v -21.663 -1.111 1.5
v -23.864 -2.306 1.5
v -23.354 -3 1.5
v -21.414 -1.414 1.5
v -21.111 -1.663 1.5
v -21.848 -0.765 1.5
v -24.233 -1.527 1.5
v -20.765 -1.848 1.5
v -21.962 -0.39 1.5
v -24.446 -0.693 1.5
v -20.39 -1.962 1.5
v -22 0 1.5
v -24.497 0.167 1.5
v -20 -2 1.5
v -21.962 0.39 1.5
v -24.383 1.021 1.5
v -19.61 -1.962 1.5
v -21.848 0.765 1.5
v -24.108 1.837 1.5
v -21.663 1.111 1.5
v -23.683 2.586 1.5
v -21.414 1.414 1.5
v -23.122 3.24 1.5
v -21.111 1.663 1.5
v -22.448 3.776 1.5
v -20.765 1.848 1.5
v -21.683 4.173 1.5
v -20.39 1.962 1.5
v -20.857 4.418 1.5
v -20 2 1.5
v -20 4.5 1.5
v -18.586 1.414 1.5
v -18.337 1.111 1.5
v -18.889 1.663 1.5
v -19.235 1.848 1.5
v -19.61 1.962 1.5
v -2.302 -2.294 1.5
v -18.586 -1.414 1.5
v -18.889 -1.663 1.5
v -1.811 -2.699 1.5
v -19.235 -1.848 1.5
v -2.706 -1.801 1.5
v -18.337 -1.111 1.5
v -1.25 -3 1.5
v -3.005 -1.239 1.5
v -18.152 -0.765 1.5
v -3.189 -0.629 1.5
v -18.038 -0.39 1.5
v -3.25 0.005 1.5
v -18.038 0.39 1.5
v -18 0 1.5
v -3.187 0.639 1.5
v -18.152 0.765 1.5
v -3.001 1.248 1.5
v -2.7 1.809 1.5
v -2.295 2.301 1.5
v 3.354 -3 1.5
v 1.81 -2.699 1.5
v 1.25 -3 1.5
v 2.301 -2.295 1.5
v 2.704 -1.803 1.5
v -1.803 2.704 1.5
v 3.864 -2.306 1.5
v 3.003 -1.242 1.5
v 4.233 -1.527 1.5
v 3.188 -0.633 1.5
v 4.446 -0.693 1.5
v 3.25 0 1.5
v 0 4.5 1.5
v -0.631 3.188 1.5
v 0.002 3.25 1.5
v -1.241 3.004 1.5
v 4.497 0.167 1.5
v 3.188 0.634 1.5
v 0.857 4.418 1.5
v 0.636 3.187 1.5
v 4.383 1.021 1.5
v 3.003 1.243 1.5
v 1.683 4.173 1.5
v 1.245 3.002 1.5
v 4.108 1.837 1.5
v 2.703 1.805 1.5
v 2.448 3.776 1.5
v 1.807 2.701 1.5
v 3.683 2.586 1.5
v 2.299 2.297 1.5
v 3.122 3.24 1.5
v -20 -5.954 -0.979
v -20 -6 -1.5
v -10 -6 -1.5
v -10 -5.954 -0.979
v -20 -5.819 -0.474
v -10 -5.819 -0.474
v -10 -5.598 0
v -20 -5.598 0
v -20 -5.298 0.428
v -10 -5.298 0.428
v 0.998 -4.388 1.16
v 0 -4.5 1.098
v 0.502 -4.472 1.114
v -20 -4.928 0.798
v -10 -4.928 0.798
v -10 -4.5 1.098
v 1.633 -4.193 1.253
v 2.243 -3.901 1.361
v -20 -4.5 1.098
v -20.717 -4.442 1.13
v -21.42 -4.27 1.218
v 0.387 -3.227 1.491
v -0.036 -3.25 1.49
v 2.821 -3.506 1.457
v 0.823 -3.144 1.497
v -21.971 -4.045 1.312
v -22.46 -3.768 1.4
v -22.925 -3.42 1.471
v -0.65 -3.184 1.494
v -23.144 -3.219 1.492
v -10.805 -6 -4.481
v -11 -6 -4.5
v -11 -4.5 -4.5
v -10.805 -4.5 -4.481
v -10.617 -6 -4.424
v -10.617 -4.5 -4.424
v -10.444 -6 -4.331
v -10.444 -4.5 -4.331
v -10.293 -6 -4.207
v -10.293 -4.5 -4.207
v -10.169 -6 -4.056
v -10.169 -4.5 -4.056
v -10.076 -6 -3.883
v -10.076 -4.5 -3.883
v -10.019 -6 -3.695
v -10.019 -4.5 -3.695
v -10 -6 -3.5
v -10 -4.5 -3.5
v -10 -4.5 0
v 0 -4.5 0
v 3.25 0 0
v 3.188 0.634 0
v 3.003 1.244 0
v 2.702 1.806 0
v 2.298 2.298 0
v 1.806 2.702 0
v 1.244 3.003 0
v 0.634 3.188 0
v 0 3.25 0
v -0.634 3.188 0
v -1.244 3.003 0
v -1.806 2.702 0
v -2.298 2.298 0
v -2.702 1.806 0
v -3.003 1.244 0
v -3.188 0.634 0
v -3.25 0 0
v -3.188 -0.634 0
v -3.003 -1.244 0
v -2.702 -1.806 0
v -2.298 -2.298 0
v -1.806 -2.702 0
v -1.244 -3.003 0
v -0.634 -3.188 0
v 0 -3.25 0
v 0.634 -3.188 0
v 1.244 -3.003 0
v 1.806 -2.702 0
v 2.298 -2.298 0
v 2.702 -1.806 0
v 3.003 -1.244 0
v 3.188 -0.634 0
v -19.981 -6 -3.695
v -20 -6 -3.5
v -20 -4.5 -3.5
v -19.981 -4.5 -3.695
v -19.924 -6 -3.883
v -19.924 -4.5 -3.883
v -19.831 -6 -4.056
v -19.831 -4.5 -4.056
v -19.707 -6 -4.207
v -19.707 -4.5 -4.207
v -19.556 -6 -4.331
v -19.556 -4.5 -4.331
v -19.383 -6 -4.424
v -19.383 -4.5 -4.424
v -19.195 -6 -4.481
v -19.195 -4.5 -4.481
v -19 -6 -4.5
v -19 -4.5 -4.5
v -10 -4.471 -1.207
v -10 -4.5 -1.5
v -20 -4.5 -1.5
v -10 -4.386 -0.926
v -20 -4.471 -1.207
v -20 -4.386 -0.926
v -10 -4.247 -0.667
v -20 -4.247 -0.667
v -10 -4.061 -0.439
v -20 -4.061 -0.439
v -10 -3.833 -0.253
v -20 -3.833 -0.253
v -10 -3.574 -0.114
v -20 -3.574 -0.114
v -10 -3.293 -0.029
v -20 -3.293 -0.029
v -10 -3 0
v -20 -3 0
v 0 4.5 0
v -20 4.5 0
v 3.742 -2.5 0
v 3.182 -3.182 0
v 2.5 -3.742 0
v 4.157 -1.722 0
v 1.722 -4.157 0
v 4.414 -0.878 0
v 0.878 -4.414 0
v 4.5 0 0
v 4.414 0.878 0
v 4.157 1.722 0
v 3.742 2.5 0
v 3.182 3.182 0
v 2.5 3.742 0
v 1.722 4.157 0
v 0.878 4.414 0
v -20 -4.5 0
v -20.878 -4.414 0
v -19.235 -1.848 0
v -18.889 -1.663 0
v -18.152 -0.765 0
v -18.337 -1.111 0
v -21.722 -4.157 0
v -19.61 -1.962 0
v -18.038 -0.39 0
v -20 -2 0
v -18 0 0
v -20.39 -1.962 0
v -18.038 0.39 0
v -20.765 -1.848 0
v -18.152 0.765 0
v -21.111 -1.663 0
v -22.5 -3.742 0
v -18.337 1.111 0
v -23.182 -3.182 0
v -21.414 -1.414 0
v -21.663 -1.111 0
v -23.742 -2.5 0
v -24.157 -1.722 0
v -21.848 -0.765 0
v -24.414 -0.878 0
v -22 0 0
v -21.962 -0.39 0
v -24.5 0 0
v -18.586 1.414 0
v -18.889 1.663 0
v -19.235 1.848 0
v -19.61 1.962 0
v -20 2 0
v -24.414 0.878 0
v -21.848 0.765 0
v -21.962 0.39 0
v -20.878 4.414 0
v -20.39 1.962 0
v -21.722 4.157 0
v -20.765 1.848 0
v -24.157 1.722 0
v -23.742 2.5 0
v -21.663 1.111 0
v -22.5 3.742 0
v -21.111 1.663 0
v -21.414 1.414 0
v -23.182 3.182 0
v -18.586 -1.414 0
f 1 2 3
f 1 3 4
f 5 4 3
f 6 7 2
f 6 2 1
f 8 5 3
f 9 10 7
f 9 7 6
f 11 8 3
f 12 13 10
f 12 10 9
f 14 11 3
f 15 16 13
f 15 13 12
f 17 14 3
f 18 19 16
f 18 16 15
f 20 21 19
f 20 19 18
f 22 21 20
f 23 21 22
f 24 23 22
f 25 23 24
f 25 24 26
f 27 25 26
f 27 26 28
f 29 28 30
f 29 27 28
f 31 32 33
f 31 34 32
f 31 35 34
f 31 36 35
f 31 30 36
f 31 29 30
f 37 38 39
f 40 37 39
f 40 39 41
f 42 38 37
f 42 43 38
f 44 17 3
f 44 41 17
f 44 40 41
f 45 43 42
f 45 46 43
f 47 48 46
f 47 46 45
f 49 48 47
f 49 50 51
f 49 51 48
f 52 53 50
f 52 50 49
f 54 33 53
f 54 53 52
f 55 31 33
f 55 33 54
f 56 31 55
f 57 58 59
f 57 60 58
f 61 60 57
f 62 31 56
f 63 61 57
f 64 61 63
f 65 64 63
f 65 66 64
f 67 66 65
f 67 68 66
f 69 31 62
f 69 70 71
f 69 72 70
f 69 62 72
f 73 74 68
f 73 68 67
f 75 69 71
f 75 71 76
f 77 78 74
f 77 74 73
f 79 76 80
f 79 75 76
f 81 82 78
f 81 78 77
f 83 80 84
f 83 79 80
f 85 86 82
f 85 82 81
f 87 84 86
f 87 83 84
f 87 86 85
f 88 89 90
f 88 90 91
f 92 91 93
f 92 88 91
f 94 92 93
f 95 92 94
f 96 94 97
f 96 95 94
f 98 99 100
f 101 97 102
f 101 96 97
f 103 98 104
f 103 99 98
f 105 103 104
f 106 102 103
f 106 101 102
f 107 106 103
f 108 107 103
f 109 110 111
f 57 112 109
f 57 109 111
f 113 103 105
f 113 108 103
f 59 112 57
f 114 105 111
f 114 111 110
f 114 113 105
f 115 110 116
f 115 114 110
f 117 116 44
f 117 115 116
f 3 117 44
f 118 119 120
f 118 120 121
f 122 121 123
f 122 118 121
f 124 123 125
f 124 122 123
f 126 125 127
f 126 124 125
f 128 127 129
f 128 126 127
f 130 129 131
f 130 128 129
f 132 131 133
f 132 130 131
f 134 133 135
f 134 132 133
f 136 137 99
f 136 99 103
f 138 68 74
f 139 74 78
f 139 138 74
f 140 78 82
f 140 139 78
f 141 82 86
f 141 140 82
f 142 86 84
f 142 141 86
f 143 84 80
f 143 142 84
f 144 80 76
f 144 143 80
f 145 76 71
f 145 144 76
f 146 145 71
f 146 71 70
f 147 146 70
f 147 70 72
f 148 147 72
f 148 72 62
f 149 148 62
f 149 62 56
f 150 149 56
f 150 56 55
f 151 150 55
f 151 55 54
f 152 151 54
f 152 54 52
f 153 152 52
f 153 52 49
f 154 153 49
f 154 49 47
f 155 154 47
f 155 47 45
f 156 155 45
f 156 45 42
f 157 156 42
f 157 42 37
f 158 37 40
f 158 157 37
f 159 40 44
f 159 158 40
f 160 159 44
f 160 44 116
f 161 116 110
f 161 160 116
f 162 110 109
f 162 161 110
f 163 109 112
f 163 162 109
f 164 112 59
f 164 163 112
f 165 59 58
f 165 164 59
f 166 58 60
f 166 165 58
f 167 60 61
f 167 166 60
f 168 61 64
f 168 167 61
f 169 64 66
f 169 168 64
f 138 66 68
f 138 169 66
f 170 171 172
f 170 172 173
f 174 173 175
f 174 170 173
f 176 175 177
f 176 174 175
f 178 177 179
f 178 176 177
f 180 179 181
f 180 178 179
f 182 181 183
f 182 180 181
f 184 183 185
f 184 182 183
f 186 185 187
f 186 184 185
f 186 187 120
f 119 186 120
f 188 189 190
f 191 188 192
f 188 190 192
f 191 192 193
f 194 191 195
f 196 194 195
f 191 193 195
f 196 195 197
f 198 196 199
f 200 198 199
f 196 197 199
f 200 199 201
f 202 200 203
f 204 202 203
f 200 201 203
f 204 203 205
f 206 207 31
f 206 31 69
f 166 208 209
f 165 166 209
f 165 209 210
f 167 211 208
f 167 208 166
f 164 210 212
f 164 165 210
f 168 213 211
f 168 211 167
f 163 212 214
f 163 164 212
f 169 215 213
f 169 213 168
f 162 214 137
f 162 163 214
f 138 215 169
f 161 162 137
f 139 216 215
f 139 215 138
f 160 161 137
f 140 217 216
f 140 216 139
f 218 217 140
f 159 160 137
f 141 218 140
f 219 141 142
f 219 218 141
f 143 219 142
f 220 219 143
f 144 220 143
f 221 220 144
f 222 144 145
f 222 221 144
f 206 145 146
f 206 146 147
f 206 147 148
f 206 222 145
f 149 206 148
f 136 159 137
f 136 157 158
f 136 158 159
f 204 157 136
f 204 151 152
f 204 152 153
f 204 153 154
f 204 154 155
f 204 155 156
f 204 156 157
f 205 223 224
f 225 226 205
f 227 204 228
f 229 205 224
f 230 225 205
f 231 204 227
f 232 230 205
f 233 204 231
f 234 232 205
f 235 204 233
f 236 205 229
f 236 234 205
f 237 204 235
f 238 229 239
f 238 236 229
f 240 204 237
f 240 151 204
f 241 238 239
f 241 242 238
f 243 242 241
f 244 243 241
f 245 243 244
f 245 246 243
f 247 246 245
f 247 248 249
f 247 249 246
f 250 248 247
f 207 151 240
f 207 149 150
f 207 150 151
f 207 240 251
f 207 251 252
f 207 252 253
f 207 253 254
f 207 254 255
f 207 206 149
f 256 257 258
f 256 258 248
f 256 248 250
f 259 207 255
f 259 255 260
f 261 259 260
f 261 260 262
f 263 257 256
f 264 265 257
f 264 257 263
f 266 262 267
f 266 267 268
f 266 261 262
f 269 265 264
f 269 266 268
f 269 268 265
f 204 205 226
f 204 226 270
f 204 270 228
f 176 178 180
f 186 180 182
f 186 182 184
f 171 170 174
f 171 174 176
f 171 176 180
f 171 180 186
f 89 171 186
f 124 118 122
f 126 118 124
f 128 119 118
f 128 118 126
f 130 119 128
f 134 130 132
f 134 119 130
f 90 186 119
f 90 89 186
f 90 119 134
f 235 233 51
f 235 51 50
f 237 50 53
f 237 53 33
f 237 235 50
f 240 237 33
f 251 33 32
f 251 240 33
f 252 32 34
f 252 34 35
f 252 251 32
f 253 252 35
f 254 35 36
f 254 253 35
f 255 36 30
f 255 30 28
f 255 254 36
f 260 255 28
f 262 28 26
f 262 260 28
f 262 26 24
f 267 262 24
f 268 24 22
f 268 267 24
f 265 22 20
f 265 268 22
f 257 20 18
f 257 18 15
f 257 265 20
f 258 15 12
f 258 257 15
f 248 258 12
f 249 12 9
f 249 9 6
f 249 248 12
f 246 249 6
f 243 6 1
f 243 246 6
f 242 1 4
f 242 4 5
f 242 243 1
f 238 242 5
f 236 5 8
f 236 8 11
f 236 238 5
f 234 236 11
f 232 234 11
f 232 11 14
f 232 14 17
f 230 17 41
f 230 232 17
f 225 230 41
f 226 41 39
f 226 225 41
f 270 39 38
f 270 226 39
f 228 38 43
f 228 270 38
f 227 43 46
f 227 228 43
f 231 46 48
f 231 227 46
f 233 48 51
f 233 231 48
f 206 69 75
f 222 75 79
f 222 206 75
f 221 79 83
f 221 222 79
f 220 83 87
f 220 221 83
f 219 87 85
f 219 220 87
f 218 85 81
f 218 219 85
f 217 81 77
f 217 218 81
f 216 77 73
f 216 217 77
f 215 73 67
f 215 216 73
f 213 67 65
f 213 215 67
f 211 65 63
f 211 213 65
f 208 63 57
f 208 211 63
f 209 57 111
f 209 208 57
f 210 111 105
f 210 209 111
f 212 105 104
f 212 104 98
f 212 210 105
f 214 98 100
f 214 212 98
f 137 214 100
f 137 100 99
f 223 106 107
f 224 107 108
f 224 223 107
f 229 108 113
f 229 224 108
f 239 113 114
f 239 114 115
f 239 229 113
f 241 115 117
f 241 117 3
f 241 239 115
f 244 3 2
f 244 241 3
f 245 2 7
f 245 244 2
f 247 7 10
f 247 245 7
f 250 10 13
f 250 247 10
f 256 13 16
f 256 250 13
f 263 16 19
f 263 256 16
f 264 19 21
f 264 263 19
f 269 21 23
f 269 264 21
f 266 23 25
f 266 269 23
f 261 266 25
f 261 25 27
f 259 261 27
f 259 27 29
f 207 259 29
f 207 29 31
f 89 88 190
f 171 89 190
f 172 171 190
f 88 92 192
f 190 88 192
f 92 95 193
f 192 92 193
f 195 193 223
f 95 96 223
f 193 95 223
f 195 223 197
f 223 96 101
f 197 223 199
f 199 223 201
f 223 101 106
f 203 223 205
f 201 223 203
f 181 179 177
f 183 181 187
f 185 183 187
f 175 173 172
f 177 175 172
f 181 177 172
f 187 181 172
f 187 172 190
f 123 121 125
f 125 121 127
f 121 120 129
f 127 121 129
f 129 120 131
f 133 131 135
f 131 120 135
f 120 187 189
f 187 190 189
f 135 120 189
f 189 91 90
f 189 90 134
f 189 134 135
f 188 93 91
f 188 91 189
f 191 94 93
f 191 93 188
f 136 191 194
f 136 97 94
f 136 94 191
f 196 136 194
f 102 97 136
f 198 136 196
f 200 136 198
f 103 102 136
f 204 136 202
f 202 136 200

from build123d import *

# Parameters (mm, degrees)
ESQUISSE1_R        = 3.25
ESQUISSE1_R_2      = 2
BOSS_EXTRU_1_DEPTH = 1.5
ESQUISSE2_W        = 10
ESQUISSE2_H        = 1.5
BOSS_EXTRU_2_DEPTH = 6
CONG_1_START       = -20
CONG_1_DEPTH       = 10
CONG_1_START_2     = -6
CONG_1_2_DEPTH     = 1.5
CONG_1_START_3     = -24.5
CONG_1_3_DEPTH     = 29


with BuildPart() as part:
    # Esquisse1 → Boss.-Extru.1 (new body)
    with BuildSketch(Plane.XY):
        with BuildLine():
            Line((0, -4.5), (-20, -4.5))
            ThreePointArc((-20, -4.5), (-24.5, 0), (-20, 4.5))
            Line((-20, 4.5), (0, 4.5))
            ThreePointArc((0, 4.5), (4.5, 0), (0, -4.5))
        make_face()
        Circle(ESQUISSE1_R, mode=Mode.SUBTRACT)
        with Locations((-20, 0)):
            Circle(ESQUISSE1_R_2, mode=Mode.SUBTRACT)
    extrude(amount=BOSS_EXTRU_1_DEPTH)

    # Esquisse2 → Boss.-Extru.2 (add)
    with BuildSketch(Plane.XY.offset(1.5)):
        with Locations((-15, -5.25)):
            Rectangle(ESQUISSE2_W, ESQUISSE2_H)
    extrude(amount=-BOSS_EXTRU_2_DEPTH)

    # Congé1: read off the stored shape, not the designer's step
    # Congé1 outline → Congé1 (add)
    with BuildSketch(Plane.YZ.offset(CONG_1_START)):
        with BuildLine():
            ThreePointArc((-4.5, -1.5), (-4.060660172, -0.439339828), (-3, 0))
            Line((-3, 0), (-4.5, 0))
            Line((-4.5, 0), (-4.5, -1.5))
        make_face()
    extrude(amount=CONG_1_DEPTH)

    # Cong_1 2 outline → Cong_1 2 (cut)
    with BuildSketch(Plane(origin=(0, 0, 0), x_dir=(1, 0, 0), z_dir=(0, 1, 0)).offset(CONG_1_START_2)):
        with BuildLine():
            ThreePointArc((-20, 3.5), (-19.707106781, 4.207106781), (-19, 4.5))
            Line((-19, 4.5), (-20, 4.5))
            Line((-20, 4.5), (-20, 3.5))
        make_face()
        with BuildLine():
            ThreePointArc((-11, 4.5), (-10.292893219, 4.207106781), (-10, 3.5))
            Line((-10, 3.5), (-10, 4.5))
            Line((-10, 4.5), (-11, 4.5))
        make_face()
    extrude(amount=CONG_1_2_DEPTH, mode=Mode.SUBTRACT)

    # Cong_1 3 outline → Cong_1 3 (cut)
    with BuildSketch(Plane.YZ.offset(CONG_1_START_3)):
        with BuildLine():
            ThreePointArc((-6, -1.5), (-5.121320344, 0.621320344), (-3, 1.5))
            Line((-3, 1.5), (-6, 1.5))
            Line((-6, 1.5), (-6, -1.5))
        make_face()
    extrude(amount=CONG_1_3_DEPTH, mode=Mode.SUBTRACT)


solid = part.part
